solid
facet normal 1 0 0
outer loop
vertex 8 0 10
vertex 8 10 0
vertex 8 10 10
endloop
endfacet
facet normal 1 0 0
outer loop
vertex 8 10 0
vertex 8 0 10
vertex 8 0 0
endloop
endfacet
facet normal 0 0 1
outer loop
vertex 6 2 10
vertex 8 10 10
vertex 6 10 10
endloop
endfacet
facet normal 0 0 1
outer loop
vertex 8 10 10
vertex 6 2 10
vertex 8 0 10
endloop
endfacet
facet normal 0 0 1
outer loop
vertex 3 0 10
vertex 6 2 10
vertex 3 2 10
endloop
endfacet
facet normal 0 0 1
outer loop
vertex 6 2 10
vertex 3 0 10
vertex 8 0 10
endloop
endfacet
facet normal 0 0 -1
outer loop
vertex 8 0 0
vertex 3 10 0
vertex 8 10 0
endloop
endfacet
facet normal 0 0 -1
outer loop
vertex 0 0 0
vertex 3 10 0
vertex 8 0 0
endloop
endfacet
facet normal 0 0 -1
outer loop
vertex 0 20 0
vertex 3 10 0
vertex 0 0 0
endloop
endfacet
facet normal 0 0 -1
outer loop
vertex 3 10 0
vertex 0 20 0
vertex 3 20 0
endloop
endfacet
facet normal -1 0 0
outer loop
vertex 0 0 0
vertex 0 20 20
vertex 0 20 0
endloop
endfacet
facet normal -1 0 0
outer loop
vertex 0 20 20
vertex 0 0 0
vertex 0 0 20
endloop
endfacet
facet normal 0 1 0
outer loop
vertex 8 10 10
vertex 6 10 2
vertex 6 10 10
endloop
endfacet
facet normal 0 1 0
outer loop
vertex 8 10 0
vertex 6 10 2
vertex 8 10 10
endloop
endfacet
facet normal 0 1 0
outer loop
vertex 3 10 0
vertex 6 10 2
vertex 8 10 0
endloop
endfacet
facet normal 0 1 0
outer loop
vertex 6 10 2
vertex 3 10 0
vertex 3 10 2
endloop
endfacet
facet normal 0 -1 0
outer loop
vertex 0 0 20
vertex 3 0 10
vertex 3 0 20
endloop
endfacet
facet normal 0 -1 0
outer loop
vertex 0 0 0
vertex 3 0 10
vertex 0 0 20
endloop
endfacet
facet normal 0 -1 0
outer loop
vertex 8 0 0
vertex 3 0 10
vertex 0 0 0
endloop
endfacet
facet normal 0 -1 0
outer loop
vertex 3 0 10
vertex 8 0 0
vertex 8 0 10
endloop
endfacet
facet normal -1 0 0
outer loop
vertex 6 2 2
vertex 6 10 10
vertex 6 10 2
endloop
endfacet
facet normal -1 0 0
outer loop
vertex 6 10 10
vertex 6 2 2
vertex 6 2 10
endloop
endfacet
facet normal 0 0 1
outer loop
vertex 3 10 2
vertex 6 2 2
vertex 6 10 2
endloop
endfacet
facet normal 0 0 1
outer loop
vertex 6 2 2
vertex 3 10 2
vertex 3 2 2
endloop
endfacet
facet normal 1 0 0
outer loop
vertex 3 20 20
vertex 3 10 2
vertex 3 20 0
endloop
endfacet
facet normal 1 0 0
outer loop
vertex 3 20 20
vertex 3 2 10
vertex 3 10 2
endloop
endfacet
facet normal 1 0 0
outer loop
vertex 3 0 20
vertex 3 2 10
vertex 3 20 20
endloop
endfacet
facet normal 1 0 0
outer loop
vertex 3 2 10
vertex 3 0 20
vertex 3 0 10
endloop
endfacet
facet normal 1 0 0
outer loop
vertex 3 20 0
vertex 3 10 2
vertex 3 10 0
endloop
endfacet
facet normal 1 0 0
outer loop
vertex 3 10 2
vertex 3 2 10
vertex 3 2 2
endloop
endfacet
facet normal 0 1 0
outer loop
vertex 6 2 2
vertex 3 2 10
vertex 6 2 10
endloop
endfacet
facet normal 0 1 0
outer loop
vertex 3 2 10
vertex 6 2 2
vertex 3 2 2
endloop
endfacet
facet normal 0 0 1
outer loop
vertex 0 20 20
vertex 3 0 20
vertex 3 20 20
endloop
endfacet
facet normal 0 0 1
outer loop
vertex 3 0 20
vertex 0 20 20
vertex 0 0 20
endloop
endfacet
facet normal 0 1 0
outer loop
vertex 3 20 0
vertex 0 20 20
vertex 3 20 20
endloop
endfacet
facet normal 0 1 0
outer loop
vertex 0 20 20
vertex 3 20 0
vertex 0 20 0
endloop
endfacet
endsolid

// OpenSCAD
difference(){
translate ([0,0,0]) cube ([8,10,10]);
translate ([3,2,2]) cube ([3,15,15]);
}
translate ([0,0,0]) cube ([3,20,20]);
